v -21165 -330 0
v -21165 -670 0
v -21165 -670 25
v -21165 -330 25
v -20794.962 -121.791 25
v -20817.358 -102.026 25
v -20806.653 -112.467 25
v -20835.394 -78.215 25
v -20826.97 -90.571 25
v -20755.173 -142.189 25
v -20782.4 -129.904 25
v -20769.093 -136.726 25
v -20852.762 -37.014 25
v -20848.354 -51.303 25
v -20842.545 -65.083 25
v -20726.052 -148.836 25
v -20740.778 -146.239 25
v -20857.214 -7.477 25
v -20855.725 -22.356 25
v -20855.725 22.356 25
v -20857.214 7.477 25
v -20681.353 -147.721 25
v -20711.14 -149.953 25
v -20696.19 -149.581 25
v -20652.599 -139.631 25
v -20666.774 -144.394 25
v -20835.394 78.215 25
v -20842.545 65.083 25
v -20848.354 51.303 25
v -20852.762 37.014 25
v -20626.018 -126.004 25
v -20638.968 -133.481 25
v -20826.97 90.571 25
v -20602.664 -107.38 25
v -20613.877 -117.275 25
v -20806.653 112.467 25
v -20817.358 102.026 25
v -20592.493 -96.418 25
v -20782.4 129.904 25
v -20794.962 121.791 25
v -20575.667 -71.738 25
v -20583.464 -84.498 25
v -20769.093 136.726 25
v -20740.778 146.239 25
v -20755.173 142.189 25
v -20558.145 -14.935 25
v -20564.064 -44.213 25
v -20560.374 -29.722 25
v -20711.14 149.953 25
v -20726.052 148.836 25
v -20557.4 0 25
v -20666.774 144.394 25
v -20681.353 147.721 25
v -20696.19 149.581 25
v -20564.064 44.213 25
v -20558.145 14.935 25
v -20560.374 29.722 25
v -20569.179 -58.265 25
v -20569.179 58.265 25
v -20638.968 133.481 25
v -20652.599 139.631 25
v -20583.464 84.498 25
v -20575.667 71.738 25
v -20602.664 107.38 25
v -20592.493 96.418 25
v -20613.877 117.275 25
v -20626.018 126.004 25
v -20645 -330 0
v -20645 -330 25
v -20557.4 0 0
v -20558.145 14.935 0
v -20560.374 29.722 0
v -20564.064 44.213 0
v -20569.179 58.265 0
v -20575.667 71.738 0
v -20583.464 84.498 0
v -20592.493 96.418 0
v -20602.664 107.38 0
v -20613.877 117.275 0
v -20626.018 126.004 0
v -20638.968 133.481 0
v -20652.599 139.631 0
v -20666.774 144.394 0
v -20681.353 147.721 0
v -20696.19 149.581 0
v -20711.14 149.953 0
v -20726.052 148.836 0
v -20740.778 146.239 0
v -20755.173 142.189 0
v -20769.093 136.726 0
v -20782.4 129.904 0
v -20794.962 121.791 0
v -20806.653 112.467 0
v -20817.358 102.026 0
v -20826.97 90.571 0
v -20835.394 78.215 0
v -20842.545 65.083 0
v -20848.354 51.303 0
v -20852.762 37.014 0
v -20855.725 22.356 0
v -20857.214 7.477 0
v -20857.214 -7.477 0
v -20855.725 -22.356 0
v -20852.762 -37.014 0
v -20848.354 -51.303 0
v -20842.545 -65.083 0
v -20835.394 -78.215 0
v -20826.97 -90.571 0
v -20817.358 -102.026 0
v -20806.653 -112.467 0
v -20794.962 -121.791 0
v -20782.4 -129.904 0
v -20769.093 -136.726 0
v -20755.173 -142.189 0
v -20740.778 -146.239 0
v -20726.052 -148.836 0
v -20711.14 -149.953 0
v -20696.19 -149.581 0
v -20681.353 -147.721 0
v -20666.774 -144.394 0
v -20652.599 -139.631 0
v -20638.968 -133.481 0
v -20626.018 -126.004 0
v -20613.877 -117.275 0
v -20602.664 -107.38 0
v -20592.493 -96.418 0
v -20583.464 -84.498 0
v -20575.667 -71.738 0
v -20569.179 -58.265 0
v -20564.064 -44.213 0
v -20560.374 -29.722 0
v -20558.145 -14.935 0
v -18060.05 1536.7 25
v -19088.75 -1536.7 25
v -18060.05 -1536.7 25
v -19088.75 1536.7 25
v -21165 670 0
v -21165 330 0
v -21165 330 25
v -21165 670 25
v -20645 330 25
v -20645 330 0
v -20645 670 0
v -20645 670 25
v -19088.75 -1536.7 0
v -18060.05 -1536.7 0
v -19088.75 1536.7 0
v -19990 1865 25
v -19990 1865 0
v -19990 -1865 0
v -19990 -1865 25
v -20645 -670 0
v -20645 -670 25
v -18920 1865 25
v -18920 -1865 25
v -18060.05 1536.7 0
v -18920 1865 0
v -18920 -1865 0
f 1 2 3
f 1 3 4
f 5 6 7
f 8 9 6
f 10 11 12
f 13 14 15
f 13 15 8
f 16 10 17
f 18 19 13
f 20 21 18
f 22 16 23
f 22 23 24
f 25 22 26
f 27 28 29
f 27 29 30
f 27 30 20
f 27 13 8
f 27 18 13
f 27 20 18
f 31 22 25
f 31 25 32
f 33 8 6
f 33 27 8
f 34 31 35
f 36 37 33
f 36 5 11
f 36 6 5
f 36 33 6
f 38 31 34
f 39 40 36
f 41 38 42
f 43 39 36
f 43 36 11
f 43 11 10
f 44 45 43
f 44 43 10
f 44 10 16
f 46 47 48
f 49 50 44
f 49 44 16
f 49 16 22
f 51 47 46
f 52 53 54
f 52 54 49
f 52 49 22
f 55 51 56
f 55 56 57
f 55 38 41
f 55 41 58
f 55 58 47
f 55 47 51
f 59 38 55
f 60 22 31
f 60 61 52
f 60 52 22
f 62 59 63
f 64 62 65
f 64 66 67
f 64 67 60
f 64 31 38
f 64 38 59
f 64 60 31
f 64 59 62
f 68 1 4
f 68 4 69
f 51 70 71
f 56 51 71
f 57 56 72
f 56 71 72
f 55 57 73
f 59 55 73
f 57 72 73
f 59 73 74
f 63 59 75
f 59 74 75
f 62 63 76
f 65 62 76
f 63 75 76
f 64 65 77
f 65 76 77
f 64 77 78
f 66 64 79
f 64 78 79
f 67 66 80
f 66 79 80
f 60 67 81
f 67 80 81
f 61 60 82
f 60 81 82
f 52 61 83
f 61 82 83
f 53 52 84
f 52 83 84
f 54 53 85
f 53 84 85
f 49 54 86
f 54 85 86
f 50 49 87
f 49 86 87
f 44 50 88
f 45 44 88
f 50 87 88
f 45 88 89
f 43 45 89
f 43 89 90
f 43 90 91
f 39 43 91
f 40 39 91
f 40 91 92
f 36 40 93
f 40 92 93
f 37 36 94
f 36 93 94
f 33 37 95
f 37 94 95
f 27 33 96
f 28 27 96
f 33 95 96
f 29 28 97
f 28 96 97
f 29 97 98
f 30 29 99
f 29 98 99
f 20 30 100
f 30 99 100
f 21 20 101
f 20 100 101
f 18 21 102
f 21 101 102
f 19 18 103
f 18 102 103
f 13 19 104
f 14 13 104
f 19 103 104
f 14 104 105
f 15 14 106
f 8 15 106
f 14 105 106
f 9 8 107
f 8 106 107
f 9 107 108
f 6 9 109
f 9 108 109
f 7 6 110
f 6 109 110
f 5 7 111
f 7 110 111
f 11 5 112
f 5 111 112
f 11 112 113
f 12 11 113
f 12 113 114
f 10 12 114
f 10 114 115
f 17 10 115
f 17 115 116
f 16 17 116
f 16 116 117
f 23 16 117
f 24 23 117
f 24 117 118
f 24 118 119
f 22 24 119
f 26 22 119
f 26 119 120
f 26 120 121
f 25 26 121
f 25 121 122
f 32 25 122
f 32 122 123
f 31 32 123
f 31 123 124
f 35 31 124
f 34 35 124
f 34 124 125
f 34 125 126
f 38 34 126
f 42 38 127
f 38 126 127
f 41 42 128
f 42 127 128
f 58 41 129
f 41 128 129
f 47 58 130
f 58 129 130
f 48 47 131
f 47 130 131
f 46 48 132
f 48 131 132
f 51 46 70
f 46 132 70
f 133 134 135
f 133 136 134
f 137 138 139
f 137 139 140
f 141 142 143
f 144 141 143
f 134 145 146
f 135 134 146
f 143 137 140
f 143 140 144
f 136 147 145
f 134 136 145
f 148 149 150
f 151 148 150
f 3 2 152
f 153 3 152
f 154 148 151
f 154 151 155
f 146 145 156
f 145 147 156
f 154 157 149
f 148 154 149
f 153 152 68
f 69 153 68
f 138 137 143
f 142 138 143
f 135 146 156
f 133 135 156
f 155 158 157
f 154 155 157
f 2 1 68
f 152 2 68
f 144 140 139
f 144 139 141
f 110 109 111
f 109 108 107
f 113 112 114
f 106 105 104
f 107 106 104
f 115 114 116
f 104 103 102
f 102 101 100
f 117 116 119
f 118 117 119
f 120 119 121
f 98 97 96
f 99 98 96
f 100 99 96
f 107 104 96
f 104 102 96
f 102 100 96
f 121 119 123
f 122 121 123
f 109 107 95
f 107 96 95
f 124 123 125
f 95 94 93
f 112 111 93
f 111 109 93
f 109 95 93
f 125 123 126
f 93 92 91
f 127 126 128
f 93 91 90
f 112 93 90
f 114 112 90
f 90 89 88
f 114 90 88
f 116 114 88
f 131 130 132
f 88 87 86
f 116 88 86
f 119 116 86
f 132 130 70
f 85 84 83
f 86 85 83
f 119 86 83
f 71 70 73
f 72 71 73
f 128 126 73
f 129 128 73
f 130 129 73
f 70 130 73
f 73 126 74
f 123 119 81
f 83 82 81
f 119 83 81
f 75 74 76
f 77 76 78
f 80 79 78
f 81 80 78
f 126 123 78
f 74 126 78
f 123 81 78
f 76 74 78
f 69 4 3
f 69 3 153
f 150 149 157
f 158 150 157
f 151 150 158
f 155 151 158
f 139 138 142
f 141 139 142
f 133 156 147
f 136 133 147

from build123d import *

# Parameters (mm, degrees)
F2_DEPTH = 25
F1_W     = 520
F1_H     = 340
F0_R     = 150


with BuildPart() as f2:
    # F1 (on Top) → F2 (new body)
    with BuildSketch(Plane.XY):
        Polygon((-18920, -1865), (-18920, 0), (-18920, 1865), (-19990, 1865), (-19990, -1865), align=None)
    extrude(amount=F2_DEPTH)


with BuildPart() as f2b:
    # F1 (on Top) → F2, piece 2 (new body)
    with BuildSketch(Plane.XY):
        with Locations((-20905, -500)):
            Rectangle(F1_W, F1_H)
    extrude(amount=F2_DEPTH)


with BuildPart() as f2c:
    # F1 (on Top) → F2, piece 3 (new body)
    with BuildSketch(Plane.XY):
        with Locations((-20905, 500)):
            Rectangle(F1_W, F1_H)
    extrude(amount=F2_DEPTH)


with BuildPart() as f2d:
    # F0 (on Top) → F2, piece 4 (new body)
    with BuildSketch(Plane.XY):
        Polygon((-19088.75, -1536.7), (-18060.05, -1536.7), (-18060.05, 0), (-18060.05, 1536.7), (-19088.75, 1536.7), align=None)
    extrude(amount=F2_DEPTH)


with BuildPart() as f2e:
    # F0 (on Top) → F2, piece 5 (new body)
    with BuildSketch(Plane.XY):
        with Locations((-20707.4, 0)):
            Circle(F0_R)
    extrude(amount=F2_DEPTH)


solid = Compound([f2.part, f2b.part, f2c.part, f2d.part, f2e.part])
